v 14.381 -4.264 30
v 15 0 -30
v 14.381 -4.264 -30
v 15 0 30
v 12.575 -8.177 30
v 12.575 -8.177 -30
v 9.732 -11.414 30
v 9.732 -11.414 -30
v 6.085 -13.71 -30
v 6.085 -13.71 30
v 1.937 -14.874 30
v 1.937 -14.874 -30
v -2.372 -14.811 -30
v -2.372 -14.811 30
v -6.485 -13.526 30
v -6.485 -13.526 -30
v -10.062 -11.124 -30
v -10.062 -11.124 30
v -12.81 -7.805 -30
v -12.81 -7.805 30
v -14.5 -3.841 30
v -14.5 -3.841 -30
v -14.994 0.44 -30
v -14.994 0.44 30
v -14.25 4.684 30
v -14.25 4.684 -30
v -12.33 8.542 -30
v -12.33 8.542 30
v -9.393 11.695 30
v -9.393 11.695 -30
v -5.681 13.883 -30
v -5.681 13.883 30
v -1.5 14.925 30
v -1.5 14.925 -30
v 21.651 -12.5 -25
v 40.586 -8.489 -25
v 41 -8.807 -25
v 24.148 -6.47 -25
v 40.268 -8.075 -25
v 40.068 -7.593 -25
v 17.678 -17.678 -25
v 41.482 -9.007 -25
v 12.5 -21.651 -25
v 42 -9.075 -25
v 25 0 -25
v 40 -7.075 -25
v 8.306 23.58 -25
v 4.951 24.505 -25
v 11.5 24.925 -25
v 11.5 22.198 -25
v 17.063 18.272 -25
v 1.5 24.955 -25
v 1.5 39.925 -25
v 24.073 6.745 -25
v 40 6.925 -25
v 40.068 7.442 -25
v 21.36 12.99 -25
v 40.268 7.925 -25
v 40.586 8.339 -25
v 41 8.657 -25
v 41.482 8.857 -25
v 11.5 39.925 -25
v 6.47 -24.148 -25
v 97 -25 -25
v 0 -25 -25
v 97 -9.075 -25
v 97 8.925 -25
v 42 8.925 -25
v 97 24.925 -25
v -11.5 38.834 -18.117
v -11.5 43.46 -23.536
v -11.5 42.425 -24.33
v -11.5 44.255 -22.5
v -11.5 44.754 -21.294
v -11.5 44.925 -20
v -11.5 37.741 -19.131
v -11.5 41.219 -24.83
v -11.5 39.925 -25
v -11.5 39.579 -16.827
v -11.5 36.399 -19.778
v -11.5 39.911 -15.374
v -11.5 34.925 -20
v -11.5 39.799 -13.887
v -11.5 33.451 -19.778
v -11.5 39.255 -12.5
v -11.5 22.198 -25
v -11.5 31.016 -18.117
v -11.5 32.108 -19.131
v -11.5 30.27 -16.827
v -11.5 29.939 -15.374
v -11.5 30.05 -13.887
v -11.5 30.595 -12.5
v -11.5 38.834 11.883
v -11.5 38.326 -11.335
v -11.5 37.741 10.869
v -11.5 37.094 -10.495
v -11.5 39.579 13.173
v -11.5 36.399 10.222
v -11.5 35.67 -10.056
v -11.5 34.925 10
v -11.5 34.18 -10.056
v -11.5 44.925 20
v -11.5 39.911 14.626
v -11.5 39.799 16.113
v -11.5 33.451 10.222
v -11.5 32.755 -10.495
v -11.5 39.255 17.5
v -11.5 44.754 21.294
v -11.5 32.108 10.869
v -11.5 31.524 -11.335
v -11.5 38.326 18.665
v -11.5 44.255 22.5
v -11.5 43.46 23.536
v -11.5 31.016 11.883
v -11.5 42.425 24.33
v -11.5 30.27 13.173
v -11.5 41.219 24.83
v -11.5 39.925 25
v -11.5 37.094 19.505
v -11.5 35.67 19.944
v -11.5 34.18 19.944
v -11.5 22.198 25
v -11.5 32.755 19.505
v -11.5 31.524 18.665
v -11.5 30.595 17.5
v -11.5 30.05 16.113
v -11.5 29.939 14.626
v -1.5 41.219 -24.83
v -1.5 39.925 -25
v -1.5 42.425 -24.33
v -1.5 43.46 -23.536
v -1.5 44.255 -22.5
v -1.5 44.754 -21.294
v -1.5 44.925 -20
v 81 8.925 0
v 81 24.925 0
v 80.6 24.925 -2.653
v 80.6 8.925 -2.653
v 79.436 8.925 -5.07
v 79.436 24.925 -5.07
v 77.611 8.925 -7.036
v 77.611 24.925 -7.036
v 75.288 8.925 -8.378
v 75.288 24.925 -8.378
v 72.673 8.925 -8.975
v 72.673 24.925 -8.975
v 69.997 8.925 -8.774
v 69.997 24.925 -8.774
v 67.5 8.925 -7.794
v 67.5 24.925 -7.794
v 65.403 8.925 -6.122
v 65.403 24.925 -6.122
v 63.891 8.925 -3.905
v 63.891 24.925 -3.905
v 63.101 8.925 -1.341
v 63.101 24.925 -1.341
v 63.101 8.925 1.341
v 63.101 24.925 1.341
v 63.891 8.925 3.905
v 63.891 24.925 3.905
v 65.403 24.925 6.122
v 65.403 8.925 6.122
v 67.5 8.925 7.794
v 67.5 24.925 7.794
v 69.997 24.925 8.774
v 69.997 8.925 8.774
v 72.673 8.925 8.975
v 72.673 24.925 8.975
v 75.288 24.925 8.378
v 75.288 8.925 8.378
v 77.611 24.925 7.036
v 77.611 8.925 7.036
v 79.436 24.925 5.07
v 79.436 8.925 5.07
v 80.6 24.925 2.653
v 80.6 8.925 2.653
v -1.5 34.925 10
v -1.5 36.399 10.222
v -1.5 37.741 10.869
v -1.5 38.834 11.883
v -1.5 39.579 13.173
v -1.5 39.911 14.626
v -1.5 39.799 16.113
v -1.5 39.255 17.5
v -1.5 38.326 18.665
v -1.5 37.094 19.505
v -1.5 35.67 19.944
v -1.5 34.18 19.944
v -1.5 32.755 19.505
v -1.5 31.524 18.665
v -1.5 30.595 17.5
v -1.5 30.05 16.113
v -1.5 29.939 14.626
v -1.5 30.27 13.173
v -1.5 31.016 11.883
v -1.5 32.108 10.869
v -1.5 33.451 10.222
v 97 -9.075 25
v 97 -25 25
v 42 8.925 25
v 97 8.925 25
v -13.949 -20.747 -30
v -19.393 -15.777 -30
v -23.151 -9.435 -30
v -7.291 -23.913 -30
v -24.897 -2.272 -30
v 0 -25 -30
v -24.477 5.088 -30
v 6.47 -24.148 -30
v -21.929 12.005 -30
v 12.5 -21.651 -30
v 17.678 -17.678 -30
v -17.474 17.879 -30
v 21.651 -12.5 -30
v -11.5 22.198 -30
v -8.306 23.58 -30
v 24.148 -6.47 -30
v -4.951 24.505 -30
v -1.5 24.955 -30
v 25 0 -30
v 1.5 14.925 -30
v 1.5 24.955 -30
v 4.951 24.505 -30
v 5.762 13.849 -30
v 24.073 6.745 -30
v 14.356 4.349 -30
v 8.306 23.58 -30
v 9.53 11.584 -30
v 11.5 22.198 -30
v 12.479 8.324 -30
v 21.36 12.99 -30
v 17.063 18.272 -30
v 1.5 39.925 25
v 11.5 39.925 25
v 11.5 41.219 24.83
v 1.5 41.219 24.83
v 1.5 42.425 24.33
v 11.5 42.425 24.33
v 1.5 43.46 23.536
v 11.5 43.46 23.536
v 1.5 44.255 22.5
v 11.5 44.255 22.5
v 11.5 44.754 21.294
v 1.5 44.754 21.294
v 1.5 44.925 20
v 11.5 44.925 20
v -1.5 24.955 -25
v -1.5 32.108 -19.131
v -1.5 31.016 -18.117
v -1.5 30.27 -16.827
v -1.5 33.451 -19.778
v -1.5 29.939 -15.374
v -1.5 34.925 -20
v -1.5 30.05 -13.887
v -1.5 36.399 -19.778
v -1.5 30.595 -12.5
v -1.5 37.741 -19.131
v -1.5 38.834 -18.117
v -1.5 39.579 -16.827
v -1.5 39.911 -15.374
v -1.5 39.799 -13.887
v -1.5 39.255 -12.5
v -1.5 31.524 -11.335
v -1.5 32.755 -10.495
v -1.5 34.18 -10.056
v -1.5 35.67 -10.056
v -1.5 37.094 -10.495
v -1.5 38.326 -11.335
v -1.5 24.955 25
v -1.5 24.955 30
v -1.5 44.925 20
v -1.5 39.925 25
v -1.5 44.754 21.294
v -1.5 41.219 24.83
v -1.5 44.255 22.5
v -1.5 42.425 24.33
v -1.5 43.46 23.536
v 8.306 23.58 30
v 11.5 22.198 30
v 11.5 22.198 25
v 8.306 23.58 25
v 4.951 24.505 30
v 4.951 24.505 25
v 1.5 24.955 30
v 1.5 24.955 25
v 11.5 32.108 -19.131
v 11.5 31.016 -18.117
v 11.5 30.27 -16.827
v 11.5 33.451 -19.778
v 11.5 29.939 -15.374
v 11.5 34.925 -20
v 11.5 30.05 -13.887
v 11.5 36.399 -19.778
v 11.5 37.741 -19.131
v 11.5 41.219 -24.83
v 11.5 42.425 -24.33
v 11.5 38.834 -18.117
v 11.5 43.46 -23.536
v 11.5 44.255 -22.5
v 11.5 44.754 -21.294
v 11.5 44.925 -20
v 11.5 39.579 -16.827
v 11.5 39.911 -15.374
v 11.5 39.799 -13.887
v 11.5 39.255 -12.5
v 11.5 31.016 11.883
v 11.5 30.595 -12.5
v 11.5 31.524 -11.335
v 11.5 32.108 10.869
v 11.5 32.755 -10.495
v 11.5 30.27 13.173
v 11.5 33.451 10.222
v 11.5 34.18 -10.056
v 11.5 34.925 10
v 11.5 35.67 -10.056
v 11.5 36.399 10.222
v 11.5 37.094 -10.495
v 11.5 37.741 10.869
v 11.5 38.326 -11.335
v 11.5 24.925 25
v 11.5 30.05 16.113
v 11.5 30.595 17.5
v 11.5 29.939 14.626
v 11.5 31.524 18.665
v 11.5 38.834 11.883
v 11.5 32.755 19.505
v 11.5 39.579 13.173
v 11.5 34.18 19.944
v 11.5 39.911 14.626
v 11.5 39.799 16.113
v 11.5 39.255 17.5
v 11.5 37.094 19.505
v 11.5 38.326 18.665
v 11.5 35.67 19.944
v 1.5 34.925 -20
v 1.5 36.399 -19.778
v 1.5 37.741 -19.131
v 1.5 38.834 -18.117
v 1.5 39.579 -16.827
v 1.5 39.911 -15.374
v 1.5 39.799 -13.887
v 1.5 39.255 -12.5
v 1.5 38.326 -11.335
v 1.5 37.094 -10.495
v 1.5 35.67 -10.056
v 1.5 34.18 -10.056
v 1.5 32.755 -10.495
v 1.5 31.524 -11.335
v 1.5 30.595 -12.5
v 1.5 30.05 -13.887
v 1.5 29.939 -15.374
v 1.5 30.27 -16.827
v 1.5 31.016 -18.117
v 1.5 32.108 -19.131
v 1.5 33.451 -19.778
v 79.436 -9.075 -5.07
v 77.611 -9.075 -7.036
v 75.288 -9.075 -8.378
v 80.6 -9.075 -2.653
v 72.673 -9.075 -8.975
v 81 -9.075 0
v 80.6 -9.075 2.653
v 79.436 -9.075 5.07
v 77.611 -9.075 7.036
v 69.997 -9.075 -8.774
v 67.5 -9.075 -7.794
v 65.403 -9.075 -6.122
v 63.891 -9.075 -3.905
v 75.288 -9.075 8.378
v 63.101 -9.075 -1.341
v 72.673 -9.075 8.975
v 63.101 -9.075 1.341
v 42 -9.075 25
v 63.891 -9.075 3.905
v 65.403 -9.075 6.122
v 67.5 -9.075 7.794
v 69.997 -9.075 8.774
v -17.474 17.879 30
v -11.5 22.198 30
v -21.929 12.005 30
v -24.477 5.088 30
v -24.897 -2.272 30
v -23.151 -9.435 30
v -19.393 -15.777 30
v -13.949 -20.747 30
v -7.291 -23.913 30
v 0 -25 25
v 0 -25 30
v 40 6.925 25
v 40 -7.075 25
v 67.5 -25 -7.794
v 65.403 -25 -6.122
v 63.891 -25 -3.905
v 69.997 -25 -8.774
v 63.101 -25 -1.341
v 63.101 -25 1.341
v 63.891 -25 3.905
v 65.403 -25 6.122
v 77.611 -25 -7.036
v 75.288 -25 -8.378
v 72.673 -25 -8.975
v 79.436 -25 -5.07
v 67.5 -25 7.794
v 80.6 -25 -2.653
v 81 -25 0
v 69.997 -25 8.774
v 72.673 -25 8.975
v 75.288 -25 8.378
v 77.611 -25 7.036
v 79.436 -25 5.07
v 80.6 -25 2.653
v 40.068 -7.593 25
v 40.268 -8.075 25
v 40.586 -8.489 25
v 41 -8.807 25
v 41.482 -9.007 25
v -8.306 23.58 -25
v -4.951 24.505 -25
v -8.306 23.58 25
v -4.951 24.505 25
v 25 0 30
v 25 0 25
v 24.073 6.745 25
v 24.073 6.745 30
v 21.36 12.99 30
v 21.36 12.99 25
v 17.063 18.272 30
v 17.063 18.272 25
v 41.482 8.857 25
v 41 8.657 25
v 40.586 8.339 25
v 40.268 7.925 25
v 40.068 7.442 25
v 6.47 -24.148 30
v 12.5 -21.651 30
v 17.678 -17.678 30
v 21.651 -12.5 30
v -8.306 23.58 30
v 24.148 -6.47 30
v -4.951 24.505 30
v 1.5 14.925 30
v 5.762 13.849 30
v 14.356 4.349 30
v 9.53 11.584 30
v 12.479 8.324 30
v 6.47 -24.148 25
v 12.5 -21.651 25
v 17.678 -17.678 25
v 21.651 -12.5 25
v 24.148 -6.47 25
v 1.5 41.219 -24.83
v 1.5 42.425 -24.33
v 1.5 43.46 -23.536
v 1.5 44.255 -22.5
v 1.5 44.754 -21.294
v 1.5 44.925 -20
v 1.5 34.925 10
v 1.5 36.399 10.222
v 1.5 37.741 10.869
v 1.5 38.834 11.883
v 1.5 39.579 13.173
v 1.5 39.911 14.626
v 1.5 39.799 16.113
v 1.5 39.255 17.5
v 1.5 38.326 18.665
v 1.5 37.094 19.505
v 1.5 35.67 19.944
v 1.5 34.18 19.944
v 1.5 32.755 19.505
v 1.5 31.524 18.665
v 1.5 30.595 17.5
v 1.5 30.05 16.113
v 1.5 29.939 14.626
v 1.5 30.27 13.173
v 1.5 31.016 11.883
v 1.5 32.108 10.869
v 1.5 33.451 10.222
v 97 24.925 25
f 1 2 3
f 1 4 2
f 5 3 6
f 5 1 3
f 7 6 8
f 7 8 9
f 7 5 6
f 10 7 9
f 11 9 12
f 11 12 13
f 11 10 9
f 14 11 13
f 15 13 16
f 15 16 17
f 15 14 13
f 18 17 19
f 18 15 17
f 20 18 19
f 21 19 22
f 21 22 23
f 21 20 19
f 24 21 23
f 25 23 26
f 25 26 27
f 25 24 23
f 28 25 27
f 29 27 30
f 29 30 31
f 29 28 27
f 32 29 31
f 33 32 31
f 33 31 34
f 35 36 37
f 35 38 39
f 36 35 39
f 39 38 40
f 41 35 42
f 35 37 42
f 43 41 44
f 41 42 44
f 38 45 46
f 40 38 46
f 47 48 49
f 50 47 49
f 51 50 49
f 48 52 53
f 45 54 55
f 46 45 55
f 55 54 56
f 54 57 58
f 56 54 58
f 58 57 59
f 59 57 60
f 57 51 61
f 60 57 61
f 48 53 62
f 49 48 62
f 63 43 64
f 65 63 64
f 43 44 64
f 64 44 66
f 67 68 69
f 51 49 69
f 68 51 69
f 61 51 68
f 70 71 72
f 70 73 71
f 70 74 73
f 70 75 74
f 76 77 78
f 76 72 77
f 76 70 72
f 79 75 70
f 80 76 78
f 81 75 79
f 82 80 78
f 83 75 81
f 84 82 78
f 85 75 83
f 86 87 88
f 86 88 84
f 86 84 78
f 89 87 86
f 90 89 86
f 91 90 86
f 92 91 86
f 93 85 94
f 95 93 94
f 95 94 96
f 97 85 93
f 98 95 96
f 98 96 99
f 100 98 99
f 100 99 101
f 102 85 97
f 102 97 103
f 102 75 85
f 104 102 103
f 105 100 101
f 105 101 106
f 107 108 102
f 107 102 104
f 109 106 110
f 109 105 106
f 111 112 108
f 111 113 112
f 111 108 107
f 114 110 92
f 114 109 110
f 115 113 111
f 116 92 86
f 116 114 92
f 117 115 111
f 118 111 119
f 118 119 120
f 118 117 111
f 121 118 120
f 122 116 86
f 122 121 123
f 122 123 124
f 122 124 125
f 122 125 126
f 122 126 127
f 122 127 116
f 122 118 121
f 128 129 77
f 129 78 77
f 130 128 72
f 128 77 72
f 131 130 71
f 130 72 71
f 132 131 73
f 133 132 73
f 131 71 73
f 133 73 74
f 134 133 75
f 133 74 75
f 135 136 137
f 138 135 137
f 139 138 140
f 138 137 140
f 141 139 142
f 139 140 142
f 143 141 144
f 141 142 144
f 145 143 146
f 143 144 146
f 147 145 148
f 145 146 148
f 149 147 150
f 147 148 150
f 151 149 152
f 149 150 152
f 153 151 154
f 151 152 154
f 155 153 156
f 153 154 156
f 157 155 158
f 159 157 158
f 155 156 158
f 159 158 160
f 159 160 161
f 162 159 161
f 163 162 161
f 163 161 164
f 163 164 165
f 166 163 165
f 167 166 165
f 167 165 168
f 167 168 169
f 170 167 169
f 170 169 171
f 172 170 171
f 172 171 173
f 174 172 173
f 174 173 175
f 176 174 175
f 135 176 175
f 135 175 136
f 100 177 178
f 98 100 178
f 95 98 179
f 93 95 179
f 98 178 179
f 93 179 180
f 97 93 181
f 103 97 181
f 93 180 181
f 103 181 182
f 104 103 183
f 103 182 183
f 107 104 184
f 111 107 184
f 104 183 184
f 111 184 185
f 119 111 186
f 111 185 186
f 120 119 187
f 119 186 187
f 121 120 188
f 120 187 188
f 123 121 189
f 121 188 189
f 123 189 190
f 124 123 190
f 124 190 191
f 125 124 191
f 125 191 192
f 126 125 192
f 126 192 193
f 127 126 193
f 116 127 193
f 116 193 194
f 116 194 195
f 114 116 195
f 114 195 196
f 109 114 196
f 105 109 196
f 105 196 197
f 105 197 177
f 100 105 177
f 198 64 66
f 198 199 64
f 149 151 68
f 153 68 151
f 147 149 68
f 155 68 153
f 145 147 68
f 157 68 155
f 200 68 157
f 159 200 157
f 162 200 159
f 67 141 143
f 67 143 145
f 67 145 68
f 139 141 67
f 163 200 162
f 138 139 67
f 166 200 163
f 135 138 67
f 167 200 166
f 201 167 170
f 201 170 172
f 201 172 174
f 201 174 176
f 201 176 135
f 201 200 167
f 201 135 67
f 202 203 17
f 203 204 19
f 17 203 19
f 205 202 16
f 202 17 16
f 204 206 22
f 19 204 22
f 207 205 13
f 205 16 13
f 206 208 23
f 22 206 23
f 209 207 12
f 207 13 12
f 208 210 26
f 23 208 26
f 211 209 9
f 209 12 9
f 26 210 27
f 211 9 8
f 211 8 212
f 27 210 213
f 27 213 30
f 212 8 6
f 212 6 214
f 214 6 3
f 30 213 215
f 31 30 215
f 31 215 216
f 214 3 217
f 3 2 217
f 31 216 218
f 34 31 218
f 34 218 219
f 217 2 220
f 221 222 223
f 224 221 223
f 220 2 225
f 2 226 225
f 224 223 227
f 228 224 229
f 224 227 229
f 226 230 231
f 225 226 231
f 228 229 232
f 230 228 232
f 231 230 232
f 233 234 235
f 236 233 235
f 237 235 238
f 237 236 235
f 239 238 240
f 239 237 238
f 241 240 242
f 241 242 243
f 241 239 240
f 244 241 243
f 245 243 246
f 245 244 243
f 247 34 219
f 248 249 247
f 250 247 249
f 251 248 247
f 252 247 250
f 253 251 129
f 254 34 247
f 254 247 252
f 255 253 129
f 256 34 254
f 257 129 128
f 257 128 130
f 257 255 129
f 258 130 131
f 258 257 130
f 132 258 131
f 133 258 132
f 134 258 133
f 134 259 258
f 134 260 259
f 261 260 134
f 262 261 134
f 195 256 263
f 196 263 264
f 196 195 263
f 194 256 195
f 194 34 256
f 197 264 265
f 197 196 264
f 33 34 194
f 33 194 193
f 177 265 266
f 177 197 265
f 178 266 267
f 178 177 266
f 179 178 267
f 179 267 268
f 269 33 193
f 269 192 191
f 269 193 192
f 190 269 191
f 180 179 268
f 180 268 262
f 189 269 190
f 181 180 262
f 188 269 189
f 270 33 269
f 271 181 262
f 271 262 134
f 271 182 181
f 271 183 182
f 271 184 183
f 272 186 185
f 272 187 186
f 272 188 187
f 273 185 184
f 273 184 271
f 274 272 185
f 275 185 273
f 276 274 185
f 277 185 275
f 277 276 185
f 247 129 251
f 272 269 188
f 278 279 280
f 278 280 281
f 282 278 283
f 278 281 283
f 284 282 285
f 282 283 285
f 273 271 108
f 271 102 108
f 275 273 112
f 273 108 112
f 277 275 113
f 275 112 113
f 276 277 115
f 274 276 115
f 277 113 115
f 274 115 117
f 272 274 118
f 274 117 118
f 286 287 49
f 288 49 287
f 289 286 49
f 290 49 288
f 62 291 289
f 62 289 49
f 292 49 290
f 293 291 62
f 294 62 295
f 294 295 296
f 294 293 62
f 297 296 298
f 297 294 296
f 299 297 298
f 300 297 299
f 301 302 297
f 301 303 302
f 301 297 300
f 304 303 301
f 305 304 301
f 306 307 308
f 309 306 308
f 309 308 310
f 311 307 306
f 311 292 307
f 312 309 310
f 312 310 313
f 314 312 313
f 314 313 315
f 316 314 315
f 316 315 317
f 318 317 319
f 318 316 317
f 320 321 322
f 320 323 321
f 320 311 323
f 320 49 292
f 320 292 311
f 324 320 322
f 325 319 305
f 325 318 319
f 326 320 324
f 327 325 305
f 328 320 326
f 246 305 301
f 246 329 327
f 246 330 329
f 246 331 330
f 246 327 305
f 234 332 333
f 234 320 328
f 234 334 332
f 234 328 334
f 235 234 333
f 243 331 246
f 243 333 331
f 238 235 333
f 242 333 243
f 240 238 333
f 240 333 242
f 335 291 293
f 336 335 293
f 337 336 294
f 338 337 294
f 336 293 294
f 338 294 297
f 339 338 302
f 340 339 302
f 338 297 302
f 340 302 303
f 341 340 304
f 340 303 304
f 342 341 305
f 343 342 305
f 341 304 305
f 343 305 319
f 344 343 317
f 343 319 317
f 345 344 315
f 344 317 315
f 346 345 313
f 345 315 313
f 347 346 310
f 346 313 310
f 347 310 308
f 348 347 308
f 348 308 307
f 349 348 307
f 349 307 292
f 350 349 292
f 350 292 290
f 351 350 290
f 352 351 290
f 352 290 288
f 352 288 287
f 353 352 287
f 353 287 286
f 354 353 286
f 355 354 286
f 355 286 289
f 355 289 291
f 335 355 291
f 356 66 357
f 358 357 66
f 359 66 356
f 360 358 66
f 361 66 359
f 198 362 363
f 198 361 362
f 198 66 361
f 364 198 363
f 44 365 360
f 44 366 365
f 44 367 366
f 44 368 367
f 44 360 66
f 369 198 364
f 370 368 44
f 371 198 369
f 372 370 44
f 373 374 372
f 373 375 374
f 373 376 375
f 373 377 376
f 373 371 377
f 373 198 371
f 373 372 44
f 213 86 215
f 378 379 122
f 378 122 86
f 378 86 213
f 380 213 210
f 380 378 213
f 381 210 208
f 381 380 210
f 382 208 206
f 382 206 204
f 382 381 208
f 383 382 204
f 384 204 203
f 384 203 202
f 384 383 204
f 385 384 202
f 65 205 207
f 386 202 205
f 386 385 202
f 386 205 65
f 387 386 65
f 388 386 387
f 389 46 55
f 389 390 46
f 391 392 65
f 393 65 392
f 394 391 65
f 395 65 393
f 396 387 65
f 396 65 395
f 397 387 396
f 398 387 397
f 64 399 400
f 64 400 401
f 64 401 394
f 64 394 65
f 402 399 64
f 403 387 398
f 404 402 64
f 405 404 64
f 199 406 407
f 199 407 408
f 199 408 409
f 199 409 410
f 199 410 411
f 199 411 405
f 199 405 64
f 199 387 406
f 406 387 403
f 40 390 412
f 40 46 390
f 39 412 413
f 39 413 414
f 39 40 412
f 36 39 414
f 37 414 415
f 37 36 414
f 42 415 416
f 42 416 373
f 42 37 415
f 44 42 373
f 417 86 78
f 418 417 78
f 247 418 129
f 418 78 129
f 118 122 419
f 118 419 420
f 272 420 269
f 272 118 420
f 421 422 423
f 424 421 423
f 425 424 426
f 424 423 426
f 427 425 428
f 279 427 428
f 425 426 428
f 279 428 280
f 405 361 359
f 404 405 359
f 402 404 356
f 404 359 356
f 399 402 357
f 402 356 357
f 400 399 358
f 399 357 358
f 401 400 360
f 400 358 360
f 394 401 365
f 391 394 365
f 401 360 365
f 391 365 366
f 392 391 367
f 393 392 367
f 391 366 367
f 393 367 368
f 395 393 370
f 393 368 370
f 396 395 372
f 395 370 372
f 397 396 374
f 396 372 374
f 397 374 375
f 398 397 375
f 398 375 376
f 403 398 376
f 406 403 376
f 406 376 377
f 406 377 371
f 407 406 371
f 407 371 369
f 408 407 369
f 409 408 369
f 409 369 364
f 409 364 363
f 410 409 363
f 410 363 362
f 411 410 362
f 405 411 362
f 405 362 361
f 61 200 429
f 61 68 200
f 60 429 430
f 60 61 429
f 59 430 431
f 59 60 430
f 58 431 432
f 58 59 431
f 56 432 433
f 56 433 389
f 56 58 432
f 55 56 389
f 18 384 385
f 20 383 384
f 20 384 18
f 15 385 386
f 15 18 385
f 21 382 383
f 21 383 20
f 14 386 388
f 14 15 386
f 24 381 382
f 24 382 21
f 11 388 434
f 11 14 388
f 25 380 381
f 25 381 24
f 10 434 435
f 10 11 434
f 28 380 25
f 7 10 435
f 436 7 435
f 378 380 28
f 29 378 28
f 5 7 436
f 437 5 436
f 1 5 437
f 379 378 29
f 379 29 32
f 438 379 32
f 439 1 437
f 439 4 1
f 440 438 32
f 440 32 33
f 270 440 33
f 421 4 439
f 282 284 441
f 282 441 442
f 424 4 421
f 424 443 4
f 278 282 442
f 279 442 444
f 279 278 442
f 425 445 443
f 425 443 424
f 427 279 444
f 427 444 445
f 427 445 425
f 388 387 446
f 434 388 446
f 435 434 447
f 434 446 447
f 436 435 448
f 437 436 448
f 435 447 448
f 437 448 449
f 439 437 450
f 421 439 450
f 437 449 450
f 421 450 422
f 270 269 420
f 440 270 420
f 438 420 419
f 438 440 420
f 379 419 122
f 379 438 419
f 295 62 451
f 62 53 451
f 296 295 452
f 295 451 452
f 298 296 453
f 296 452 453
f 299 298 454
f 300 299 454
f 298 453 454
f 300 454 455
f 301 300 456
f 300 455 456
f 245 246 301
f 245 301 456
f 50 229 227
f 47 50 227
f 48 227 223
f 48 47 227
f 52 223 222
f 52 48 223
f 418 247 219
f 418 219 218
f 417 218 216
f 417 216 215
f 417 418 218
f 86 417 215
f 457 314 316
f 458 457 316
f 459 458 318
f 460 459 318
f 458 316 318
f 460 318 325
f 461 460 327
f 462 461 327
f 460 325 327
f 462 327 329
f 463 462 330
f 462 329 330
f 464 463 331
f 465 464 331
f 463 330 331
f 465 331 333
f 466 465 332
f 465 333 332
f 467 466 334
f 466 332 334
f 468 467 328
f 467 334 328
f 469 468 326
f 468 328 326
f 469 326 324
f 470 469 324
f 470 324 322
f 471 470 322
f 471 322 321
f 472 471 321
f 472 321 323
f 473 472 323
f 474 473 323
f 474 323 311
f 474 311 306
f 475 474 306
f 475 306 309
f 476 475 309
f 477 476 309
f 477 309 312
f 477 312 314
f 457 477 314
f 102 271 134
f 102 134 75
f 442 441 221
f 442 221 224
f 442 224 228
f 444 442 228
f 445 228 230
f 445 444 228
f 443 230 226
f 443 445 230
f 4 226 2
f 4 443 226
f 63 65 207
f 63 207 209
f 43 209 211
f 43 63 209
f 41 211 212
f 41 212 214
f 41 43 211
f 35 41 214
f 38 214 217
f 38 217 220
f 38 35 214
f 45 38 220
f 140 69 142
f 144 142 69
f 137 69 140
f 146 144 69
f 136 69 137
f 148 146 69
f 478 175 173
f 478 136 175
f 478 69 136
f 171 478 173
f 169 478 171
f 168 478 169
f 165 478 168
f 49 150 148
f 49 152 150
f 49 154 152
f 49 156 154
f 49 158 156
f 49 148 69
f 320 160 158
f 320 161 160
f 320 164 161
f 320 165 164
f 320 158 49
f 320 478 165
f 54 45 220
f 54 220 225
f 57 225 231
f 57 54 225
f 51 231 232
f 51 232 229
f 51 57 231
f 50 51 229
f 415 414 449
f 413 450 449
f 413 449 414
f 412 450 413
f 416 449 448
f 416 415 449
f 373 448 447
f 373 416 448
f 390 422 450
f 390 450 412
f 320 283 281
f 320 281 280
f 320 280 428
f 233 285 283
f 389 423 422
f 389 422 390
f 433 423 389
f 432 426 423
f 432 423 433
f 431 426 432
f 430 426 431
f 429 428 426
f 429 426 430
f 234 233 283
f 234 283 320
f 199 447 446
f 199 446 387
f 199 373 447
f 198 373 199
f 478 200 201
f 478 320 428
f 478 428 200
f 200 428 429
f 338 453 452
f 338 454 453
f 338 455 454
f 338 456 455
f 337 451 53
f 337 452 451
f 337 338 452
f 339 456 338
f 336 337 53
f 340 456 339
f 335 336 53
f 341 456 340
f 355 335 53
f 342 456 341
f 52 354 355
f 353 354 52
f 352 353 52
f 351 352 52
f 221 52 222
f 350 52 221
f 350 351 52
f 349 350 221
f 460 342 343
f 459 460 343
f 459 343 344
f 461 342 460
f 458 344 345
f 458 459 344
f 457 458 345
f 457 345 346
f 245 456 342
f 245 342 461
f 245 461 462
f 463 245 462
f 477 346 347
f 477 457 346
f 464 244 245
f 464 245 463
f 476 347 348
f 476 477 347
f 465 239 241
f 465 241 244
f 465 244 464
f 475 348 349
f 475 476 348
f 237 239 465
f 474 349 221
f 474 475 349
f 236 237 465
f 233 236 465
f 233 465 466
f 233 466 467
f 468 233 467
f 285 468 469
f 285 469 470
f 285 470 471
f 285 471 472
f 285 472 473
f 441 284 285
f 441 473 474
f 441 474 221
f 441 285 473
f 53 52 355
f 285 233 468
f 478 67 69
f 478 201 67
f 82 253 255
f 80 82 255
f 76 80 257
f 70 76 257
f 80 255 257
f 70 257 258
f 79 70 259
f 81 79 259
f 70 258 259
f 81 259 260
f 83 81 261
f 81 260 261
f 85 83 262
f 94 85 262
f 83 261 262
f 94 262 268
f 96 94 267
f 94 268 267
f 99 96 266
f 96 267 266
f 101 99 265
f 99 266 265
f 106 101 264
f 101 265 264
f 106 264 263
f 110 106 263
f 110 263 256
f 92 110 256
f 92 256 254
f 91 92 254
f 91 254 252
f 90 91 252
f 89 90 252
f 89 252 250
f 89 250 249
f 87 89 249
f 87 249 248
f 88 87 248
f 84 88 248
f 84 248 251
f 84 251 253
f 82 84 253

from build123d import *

# Parameters (mm, degrees)
ESTRUSIONE_ESTRUSIONE3_DEPTH = 30
ESTRUSIONE_ESTRUSIONE4_DEPTH = 25
FORO_18_0_18_1_D             = 18
FORO_10_0_10_1_D             = 10
RACCORDO1_R                  = 5
RACCORDO2_R                  = 2


with BuildPart() as part:
    # Schizzo1 → Estrusione-Estrusione3 (new, symmetric)
    with BuildSketch(Plane.XY):
        with BuildLine():
            ThreePointArc((-1.5, 24.954959427), (-6.644564975, 24.100824805), (-11.5, 22.19797288))
            ThreePointArc((-11.5, 22.19797288), (-24.289394002, -5.918220932), (0, -25))
            ThreePointArc((0, -25), (17.67766953, -17.67766953), (25, 0))
            ThreePointArc((25, 0), (21.360009363, 12.990381057), (11.5, 22.19797288))
            ThreePointArc((11.5, 22.19797288), (6.644564975, 24.100824805), (1.5, 24.954959427))
            Line((1.5, 24.954959427), (1.5, 14.924811557))
            ThreePointArc((1.5, 14.924811557), (11.124297731, 10.062305899), (15, 0))
            ThreePointArc((15, 0), (-10.062305899, -11.124297731), (-1.5, 14.924811557))
            Line((-1.5, 14.924811557), (-1.5, 24.954959427))
        make_face()
    extrude(amount=ESTRUSIONE_ESTRUSIONE3_DEPTH, both=True)

    # Schizzo1<3> → Estrusione-Estrusione4 (add, symmetric)
    with BuildSketch(Plane.XY):
        with BuildLine():
            Line((-11.5, 44.924811557), (-11.5, 22.19797288))
            ThreePointArc((-11.5, 22.19797288), (-6.644564975, 24.100824805), (-1.5, 24.954959427))
            Line((-1.5, 24.954959427), (-1.5, 44.924811557))
            Line((-1.5, 44.924811557), (-11.5, 44.924811557))
        make_face()
        with BuildLine():
            Line((0, -25), (97, -25))
            Line((97, -25), (97, -9.075188443))
            Line((97, -9.075188443), (40, -9.075188443))
            Line((40, -9.075188443), (40, 8.924811557))
            Line((40, 8.924811557), (97, 8.924811557))
            Line((97, 8.924811557), (97, 24.924811557))
            Line((97, 24.924811557), (11.5, 24.924811557))
            Line((11.5, 24.924811557), (11.5, 44.924811557))
            Line((11.5, 44.924811557), (1.5, 44.924811557))
            Line((1.5, 44.924811557), (1.5, 24.954959427))
            ThreePointArc((1.5, 24.954959427), (24.98873732, -0.750338033), (0, -25))
        make_face()
    extrude(amount=ESTRUSIONE_ESTRUSIONE4_DEPTH, both=True)

    # Foro Ø18.0 (18)-1 (through all)
    with Locations(Plane(origin=(0, -25, 0), x_dir=(-1, 0, 0), z_dir=(0, -1, 0))):
        with Locations((-72, 0)):
            Hole(FORO_18_0_18_1_D / 2)

    # Foro Ø10.0 (10)-1 (through all)
    with Locations(Plane.ZY.offset(11.5)):
        with Locations((15, 34.924811557), (-15, 34.924811557)):
            Hole(FORO_10_0_10_1_D / 2)

    # Raccordo1
    raccordo1_edges = [part.edges().sort_by_distance(p)[0] for p in [
        (-6.5, 44.924811557, 25),
        (6.5, 44.924811557, 25),
        (-6.5, 44.924811557, -25),
        (6.5, 44.924811557, -25),
    ]]
    fillet(raccordo1_edges, radius=RACCORDO1_R)

    # Raccordo2
    raccordo2_edges = [part.edges().sort_by_distance(p)[0] for p in [
        (40, -9.075188443, 0),
        (40, 8.924811557, 0),
    ]]
    fillet(raccordo2_edges, radius=RACCORDO2_R)


solid = part.part
